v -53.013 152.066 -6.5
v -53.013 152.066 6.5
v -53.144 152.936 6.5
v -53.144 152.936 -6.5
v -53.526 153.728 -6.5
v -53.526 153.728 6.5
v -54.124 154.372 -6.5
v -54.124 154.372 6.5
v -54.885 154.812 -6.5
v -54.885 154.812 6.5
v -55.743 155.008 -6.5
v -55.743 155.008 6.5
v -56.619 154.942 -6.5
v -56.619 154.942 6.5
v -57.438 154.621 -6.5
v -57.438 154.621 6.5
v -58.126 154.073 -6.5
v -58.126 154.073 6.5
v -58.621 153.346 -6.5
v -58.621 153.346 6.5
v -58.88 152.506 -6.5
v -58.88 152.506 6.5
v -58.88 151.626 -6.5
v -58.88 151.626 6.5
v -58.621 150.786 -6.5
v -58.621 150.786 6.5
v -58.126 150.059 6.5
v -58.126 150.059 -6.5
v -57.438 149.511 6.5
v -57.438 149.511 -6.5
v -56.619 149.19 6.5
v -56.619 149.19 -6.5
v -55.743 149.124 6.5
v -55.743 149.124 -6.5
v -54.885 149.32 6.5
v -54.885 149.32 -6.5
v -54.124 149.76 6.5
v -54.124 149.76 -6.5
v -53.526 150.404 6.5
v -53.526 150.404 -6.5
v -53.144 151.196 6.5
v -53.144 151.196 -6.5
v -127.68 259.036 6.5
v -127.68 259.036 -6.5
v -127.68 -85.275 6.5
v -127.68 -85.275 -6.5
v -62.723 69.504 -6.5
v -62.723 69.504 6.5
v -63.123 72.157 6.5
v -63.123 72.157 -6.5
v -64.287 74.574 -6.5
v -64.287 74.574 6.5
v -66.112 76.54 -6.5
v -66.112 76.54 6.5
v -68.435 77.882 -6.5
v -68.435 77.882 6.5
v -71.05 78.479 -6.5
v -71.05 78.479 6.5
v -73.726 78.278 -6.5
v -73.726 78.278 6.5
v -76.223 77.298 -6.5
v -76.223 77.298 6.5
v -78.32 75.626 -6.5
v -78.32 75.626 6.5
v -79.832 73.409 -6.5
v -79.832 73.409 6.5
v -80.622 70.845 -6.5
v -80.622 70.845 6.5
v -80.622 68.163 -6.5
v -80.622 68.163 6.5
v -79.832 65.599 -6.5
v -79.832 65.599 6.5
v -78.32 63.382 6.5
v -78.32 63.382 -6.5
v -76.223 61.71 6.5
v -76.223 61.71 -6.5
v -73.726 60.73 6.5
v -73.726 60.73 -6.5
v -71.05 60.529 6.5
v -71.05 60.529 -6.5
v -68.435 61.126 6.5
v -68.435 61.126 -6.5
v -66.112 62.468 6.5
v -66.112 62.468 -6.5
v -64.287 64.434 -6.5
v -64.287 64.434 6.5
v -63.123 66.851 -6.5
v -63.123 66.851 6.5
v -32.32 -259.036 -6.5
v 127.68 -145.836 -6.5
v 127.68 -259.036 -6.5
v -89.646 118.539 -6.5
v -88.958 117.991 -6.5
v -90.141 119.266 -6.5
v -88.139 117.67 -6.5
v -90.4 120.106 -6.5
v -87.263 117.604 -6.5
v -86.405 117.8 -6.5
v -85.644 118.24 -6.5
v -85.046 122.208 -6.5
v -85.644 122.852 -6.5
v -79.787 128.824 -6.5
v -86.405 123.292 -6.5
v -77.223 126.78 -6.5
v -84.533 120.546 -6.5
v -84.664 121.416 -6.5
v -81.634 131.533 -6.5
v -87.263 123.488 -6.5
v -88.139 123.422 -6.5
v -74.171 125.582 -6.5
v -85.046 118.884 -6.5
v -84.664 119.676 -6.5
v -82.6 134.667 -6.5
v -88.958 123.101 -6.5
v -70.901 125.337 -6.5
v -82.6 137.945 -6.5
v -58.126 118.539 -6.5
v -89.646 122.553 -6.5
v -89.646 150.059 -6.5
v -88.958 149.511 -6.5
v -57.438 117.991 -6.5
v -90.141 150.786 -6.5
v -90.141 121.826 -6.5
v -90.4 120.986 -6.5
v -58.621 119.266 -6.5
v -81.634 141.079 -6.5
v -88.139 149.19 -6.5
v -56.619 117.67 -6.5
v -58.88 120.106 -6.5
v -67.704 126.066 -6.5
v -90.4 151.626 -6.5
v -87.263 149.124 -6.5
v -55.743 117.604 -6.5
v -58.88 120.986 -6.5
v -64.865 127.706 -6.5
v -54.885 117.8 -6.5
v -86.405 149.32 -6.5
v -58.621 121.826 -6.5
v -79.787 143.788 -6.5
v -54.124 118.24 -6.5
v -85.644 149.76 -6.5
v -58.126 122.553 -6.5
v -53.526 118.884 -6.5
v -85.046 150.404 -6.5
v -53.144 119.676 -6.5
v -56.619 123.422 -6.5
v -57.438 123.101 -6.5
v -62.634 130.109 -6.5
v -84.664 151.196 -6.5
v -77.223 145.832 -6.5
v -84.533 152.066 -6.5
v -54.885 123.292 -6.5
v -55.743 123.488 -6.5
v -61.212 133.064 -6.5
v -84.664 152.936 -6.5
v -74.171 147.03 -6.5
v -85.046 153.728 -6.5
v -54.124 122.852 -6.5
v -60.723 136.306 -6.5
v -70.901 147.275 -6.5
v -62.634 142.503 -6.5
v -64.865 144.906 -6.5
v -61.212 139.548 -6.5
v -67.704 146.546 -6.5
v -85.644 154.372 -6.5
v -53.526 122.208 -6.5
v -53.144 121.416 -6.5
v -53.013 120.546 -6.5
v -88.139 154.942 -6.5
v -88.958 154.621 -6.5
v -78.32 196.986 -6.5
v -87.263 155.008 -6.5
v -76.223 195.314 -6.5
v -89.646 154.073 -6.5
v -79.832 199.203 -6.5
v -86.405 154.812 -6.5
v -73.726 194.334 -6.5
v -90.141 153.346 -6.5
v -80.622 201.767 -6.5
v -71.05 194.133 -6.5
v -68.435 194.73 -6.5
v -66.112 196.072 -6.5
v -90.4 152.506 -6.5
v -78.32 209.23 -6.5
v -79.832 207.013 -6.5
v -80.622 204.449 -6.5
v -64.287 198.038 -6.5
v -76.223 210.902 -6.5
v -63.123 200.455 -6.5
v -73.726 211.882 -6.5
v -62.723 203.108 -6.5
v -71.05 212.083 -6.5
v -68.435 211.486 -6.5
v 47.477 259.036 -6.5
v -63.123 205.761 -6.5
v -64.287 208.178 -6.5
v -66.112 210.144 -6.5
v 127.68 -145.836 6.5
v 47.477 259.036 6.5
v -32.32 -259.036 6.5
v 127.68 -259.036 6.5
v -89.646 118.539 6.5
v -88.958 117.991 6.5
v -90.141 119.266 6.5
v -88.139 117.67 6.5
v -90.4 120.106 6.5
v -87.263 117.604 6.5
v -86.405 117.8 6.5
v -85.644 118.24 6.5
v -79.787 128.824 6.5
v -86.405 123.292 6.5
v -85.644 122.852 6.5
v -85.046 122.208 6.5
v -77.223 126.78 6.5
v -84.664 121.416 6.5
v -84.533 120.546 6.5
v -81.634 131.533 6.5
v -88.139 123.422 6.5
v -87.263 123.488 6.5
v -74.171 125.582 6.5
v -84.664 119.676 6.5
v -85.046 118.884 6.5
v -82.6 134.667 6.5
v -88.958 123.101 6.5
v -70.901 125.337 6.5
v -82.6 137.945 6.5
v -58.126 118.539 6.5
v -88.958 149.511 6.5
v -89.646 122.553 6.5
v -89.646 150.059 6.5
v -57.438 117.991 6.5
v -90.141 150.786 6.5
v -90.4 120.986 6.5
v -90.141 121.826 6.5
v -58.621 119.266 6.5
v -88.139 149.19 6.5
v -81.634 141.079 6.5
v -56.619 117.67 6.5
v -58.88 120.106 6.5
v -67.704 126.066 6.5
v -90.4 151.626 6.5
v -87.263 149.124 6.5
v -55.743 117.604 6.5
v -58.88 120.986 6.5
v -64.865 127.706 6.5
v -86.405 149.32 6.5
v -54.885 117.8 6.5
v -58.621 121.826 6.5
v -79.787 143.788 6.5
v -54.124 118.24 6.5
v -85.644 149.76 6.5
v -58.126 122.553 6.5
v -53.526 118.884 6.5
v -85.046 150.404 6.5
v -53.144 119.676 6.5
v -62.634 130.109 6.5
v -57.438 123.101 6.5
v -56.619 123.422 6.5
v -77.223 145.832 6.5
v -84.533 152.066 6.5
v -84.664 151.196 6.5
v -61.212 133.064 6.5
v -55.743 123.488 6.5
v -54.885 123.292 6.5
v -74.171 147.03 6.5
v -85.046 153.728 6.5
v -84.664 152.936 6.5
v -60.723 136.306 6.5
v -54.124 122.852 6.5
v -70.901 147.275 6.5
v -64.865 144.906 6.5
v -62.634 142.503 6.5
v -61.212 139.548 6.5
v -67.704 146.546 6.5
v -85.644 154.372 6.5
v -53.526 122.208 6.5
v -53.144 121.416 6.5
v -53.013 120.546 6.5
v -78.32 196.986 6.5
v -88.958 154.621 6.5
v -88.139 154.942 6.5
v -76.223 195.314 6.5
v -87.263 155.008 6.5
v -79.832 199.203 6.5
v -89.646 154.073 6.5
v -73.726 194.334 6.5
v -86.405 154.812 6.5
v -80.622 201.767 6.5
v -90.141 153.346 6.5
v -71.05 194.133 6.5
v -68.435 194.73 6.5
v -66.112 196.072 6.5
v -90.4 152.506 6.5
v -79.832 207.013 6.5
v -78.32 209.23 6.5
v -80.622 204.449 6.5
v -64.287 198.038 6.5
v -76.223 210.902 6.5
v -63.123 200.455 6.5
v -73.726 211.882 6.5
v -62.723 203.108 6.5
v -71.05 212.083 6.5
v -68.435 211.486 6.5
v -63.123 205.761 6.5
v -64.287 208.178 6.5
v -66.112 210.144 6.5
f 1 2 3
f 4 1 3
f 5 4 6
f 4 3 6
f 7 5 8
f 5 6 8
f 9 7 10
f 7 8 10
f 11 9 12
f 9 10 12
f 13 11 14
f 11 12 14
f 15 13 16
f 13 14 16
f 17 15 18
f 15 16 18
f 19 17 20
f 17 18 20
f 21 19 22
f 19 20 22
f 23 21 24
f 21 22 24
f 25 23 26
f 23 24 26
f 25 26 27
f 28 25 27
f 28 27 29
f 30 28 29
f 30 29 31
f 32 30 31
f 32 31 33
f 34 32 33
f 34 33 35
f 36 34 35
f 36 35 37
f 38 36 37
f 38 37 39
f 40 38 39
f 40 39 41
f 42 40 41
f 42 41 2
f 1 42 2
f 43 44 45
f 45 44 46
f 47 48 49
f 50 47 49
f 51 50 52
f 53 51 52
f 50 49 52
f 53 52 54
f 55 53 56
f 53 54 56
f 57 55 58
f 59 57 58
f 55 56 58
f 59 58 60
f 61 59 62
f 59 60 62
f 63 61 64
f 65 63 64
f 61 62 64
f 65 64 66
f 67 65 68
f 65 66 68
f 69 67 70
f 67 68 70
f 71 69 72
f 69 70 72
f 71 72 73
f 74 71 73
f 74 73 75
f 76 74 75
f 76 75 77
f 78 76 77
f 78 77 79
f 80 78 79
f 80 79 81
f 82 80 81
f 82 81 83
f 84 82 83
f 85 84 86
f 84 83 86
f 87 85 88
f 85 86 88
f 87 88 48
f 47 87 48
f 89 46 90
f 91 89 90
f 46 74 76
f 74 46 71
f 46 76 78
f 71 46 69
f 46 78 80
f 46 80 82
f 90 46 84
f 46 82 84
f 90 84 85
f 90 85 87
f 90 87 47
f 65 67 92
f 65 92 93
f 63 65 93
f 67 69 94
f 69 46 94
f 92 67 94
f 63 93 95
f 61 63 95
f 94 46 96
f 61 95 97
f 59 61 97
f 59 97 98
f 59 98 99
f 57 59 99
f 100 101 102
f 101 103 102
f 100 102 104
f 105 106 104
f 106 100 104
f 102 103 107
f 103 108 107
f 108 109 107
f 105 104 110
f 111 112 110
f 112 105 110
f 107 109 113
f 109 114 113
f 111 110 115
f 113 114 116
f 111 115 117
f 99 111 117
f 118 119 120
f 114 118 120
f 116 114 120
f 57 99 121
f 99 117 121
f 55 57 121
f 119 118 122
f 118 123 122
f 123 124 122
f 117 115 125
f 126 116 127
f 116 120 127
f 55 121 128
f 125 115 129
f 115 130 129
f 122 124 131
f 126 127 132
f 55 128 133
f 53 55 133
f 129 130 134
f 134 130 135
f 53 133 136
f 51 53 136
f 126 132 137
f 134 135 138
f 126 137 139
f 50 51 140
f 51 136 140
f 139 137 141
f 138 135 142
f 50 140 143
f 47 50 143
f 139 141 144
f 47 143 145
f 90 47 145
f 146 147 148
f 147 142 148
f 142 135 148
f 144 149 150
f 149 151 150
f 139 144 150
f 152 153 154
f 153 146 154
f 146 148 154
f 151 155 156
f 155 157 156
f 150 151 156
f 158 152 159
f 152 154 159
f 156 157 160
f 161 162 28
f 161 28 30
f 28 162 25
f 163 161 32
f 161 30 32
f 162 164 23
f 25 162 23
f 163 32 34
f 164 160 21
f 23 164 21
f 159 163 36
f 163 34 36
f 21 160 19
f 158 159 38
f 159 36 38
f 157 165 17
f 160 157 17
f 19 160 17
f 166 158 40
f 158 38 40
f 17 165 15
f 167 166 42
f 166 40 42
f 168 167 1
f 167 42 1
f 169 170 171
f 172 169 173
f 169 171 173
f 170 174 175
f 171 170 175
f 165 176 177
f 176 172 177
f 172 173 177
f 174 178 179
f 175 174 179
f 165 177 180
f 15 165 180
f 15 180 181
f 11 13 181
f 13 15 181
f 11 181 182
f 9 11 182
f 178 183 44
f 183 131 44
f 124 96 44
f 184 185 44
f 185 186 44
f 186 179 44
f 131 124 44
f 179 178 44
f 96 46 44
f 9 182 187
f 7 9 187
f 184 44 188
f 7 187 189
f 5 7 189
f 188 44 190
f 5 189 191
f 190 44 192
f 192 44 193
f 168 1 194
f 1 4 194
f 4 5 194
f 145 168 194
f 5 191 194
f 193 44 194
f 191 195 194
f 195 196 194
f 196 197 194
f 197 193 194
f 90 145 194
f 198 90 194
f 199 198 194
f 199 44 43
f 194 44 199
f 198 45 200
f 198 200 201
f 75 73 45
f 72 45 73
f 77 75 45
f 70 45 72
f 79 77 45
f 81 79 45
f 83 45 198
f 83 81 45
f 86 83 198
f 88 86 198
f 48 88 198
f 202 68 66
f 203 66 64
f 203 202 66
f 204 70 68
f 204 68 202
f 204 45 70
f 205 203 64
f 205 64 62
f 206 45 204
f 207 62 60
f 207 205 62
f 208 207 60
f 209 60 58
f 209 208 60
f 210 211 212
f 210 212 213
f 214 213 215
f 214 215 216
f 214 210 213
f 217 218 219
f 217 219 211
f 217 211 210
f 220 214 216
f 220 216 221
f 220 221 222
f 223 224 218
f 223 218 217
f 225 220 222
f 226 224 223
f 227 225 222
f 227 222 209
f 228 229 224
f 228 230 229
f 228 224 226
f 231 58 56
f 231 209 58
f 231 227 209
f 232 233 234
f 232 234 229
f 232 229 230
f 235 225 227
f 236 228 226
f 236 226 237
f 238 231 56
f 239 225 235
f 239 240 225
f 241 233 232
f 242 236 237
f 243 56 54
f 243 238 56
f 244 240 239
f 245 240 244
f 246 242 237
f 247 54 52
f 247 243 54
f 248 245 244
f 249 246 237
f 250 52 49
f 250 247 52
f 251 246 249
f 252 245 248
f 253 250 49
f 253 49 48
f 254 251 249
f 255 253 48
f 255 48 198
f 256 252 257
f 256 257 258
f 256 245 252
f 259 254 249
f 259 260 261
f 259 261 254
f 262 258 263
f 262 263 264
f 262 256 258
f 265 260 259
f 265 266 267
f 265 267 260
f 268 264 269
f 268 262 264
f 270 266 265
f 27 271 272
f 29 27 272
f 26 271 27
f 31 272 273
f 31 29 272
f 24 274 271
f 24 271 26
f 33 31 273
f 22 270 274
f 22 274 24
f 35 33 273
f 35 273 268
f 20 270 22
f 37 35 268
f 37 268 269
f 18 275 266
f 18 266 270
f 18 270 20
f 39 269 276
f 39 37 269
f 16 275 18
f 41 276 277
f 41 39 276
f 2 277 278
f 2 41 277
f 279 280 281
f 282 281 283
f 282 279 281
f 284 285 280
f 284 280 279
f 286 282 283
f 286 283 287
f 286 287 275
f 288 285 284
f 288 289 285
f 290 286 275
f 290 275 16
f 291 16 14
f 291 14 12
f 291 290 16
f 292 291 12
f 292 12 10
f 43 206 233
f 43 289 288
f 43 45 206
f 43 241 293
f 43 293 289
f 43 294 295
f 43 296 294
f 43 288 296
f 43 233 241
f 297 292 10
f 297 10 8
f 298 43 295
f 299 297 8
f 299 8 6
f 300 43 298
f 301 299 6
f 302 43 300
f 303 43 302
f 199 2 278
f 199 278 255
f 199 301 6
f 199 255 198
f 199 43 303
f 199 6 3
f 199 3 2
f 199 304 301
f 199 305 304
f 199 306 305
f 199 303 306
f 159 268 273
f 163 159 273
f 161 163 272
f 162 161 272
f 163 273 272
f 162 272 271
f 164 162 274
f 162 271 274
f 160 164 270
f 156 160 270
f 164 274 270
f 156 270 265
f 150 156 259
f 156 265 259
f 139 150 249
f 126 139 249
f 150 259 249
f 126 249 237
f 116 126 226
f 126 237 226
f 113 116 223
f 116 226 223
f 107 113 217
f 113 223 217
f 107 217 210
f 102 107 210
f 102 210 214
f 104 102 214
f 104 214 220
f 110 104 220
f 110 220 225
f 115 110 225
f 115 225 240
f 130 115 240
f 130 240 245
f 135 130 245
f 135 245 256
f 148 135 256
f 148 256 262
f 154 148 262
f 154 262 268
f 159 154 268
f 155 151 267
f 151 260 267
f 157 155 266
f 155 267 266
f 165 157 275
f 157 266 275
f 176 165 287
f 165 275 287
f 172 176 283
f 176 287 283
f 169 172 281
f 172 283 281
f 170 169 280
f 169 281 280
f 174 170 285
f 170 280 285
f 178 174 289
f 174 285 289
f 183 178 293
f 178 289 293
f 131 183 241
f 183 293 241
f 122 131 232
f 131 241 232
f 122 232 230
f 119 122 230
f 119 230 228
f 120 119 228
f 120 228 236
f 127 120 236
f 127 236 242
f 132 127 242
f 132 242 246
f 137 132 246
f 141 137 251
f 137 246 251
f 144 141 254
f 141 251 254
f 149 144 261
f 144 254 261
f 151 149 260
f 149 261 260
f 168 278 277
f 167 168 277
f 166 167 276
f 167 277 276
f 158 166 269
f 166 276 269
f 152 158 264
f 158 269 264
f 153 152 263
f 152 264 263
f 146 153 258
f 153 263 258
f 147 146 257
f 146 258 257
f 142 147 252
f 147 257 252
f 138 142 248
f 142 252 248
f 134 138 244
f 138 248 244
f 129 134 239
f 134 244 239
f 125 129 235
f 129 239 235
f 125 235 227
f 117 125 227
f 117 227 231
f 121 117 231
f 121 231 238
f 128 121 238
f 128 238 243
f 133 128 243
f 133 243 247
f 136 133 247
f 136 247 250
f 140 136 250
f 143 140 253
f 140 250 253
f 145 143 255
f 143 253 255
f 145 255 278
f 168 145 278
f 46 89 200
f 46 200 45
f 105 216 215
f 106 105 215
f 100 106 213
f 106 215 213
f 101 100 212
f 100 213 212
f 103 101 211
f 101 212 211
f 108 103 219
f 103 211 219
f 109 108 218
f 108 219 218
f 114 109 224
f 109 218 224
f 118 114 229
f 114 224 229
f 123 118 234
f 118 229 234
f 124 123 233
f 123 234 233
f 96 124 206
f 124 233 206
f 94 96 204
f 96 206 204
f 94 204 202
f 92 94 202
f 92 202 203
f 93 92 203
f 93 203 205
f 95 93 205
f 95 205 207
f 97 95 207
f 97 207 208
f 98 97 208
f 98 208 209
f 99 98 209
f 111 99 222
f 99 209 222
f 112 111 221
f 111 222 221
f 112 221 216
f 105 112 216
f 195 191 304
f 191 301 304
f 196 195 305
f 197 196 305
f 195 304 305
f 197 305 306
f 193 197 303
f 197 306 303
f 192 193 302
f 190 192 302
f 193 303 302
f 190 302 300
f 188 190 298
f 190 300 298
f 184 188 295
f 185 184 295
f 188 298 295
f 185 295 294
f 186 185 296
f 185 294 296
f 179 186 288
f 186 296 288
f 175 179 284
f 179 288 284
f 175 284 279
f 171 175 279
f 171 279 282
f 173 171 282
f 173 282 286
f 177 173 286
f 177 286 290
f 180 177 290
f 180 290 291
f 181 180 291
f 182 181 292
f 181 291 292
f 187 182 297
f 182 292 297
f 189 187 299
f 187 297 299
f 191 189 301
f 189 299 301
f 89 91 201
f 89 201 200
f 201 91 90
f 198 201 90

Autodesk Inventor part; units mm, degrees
ref_plane "YZ Plane" through (0, 0, 0) normal (1, 0, 0) x (0, 1, 0)
ref_plane "XZ Plane" through (0, 0, 0) normal (0, 1, 0) x (-1, 0, 0)
ref_plane "XY Plane" through (0, 0, 0) normal (0, 0, 1) x (1, 0, 0)
sketch "Sketch1" plane through (0, 0, 0) normal (0, 0, 1) x (1, 0, 0)
  line L0 (-127.68, 259.036) -> (-127.68, -85.275)
  line L1 (-127.68, 259.036) -> (47.477, 259.036)
  line L2 (127.68, -259.036) -> (-32.32, -259.036)
  line L3 (-32.32, -259.036) -> (-127.68, -85.275)
  line L4 (127.68, -259.036) -> (127.68, -145.836)
  line L5 (127.68, -145.836) -> (47.477, 259.036)
  point P0 (0, 0)
  dimension "d6" = 344.311
  dimension "d7" = 175.157
  dimension "d9" = 160
  dimension "d10" = 113.2
extrude "Extrusion1" add sketch "Sketch1" along normal mid plane 13
sketch "Sketch2" plane through (0, 0, 6.5) normal (0, 0, 1) x (1, 0, 0)
  circle A0 centre (-71.723, 203.108) radius 9
  circle A1 centre (-71.723, 69.504) radius 9
  circle A2 centre (-71.723, 136.306) radius 11
  line L0 (-87.483, 152.066) -> (-55.963, 152.066)
  line L1 (-55.963, 152.066) -> (-55.963, 120.546)
  line L2 (-55.963, 120.546) -> (-87.483, 120.546)
  line L3 (-87.483, 120.546) -> (-87.483, 152.066)
  line L4 (-87.483, 152.066) -> (-55.963, 120.546) construction
  line L5 (-55.963, 152.066) -> (-87.483, 120.546) construction
  circle A3 centre (-87.483, 152.066) radius 2.95
  circle A4 centre (-55.963, 152.066) radius 2.95
  circle A5 centre (-55.963, 120.546) radius 2.95
  circle A6 centre (-87.483, 120.546) radius 2.95
  line L6 (47.477, 259.036) -> (-127.68, 259.036) projected
  line L7 (-127.68, 259.036) -> (-127.68, -85.275) projected
  point P0 (0, 0)
  point P1 (-71.723, 136.306)
  dimension "d25" = 22
  dimension "d26" = 66.802
  dimension "d31" = 31.52
  dimension "d32" = 31.52
  dimension "d35" = 5.9
  dimension "d39" = 66.802
  dimension "d40" = 55.928
  dimension "d41" = 55.957
  dimension "d42" = 5.9
extrude "Extrusion3" cut sketch "Sketch2" against normal blind 25.4 contours A0 | A1 | A2 | L3 A3 L0 | L0 A3 L3 | A4 L1 L0 | L0 L1 A4 | A6 L2 L3 | L3 L2 A6 | A5 L2 L1 | L1 L2 A5
equation "\"d32\" = d31"
properties part number "CNC-Y-axis- side plates with stepper"
